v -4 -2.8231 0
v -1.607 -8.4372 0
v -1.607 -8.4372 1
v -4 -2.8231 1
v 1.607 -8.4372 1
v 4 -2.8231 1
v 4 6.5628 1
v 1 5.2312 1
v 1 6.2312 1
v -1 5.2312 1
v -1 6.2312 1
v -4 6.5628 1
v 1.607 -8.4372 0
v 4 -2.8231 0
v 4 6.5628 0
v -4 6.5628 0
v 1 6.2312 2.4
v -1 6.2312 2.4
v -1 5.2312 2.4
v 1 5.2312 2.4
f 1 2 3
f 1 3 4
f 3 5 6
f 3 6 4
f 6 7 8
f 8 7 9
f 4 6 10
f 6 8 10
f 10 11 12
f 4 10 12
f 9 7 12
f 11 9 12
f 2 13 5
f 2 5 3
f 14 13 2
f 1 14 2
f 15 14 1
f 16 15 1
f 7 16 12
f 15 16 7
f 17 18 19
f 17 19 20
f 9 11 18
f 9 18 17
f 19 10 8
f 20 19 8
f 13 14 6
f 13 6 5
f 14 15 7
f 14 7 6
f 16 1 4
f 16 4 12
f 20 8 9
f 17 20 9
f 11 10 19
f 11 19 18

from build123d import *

# Parameters (mm, degrees)
BOSS_EXTRUDE1_DEPTH = 1
SKETCH2_W           = 2
SKETCH2_H           = 1
BOSS_EXTRUDE2_DEPTH = 1.4


with BuildPart() as part:
    # Sketch1 → Boss-Extrude1 (new body)
    with BuildSketch(Plane.XY):
        Polygon((-4, 6.562771437), (4, 6.562771437), (4, -2.823087523), (1.607040609, -8.437228563), (-1.607040609, -8.437228563), (-4, -2.823087523), align=None)
    extrude(amount=BOSS_EXTRUDE1_DEPTH)

    # Sketch2 → Boss-Extrude2 (add)
    with BuildSketch(Plane.XY.offset(1)):
        with Locations((0, 5.731176547)):
            Rectangle(SKETCH2_W, SKETCH2_H)
    extrude(amount=BOSS_EXTRUDE2_DEPTH)


solid = part.part
